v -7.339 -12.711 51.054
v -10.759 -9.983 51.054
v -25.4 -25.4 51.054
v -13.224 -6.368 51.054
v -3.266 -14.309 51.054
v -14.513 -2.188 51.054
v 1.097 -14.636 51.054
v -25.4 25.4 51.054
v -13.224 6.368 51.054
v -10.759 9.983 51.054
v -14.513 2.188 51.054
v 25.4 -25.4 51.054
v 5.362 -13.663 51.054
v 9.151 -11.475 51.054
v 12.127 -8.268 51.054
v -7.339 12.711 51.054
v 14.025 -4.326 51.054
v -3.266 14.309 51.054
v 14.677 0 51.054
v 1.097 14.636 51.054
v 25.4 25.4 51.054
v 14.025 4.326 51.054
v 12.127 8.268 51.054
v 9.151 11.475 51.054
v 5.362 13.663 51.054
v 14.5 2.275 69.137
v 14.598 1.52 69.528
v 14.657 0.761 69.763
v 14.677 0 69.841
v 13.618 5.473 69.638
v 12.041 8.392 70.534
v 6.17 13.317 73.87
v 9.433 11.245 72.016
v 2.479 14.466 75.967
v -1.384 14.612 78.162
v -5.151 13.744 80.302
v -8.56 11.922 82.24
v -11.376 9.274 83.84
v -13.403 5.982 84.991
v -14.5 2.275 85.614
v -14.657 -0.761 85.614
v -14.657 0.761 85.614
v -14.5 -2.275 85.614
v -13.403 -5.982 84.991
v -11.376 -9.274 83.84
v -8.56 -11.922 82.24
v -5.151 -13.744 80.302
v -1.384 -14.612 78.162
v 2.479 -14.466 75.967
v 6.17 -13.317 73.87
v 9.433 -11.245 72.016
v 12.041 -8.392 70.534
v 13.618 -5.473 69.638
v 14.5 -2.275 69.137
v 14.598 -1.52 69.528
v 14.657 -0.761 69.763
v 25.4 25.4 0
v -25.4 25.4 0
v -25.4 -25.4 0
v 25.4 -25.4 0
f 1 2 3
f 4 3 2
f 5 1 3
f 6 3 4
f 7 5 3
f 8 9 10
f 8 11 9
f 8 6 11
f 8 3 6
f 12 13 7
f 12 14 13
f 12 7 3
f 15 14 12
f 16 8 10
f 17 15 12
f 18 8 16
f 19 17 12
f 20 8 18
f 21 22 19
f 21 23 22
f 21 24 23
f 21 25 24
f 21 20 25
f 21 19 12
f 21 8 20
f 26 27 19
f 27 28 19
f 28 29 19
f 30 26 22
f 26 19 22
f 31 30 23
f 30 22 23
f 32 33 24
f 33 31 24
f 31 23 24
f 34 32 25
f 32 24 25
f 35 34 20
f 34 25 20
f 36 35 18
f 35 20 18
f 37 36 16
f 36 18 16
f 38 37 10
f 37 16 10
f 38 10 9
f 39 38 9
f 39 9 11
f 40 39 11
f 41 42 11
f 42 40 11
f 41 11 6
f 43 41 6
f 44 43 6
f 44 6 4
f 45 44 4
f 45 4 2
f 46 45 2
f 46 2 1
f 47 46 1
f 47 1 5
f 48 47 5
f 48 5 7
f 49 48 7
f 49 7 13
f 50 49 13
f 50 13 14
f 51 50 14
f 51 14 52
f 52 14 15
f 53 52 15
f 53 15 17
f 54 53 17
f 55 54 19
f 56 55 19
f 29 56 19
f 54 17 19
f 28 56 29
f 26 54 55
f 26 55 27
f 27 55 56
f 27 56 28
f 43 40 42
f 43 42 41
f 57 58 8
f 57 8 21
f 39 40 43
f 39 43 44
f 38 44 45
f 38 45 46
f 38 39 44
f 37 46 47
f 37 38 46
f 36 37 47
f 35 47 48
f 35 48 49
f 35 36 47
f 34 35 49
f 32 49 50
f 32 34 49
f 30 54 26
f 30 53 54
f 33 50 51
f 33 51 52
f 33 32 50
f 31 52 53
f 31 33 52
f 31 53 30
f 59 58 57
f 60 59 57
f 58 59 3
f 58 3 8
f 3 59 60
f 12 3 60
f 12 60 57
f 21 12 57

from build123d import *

# Parameters (mm, degrees)
F0_W     = 50.8
F0_H     = 50.8
F1_DEPTH = 51.054
F2_R     = 14.677171
F3_DEPTH = 43.688
F5_DEPTH = 25.4
F6_DEPTH = 25.4


with BuildPart() as f1:
    # F0 (on Top) → F1 (new body)
    with BuildSketch(Plane.XY):
        Rectangle(F0_W, F0_H)
    extrude(amount=F1_DEPTH)

    # F2 (on face) → F3 (join)
    with BuildSketch(Plane.XY.offset(51.054)):
        Circle(F2_R)
    extrude(amount=F3_DEPTH)

    # F4 (on Front) → F5 (cut)
    with BuildSketch(Plane.XZ):
        Polygon((-17.87798, 85.614286), (-14.499731, 85.614286), (14.499732, 69.13732), (21.090519, 95.280774), (-17.35574, 97.038314), align=None)
    extrude(amount=F5_DEPTH, mode=Mode.SUBTRACT)

    # F4 (on Front) → F6 (cut)
    with BuildSketch(Plane.XZ):
        Polygon((-17.87798, 85.614286), (-14.499731, 85.614286), (14.499732, 69.13732), (21.090519, 95.280774), (-17.35574, 97.038314), align=None)
    extrude(amount=-F6_DEPTH, mode=Mode.SUBTRACT)


solid = f1.part
